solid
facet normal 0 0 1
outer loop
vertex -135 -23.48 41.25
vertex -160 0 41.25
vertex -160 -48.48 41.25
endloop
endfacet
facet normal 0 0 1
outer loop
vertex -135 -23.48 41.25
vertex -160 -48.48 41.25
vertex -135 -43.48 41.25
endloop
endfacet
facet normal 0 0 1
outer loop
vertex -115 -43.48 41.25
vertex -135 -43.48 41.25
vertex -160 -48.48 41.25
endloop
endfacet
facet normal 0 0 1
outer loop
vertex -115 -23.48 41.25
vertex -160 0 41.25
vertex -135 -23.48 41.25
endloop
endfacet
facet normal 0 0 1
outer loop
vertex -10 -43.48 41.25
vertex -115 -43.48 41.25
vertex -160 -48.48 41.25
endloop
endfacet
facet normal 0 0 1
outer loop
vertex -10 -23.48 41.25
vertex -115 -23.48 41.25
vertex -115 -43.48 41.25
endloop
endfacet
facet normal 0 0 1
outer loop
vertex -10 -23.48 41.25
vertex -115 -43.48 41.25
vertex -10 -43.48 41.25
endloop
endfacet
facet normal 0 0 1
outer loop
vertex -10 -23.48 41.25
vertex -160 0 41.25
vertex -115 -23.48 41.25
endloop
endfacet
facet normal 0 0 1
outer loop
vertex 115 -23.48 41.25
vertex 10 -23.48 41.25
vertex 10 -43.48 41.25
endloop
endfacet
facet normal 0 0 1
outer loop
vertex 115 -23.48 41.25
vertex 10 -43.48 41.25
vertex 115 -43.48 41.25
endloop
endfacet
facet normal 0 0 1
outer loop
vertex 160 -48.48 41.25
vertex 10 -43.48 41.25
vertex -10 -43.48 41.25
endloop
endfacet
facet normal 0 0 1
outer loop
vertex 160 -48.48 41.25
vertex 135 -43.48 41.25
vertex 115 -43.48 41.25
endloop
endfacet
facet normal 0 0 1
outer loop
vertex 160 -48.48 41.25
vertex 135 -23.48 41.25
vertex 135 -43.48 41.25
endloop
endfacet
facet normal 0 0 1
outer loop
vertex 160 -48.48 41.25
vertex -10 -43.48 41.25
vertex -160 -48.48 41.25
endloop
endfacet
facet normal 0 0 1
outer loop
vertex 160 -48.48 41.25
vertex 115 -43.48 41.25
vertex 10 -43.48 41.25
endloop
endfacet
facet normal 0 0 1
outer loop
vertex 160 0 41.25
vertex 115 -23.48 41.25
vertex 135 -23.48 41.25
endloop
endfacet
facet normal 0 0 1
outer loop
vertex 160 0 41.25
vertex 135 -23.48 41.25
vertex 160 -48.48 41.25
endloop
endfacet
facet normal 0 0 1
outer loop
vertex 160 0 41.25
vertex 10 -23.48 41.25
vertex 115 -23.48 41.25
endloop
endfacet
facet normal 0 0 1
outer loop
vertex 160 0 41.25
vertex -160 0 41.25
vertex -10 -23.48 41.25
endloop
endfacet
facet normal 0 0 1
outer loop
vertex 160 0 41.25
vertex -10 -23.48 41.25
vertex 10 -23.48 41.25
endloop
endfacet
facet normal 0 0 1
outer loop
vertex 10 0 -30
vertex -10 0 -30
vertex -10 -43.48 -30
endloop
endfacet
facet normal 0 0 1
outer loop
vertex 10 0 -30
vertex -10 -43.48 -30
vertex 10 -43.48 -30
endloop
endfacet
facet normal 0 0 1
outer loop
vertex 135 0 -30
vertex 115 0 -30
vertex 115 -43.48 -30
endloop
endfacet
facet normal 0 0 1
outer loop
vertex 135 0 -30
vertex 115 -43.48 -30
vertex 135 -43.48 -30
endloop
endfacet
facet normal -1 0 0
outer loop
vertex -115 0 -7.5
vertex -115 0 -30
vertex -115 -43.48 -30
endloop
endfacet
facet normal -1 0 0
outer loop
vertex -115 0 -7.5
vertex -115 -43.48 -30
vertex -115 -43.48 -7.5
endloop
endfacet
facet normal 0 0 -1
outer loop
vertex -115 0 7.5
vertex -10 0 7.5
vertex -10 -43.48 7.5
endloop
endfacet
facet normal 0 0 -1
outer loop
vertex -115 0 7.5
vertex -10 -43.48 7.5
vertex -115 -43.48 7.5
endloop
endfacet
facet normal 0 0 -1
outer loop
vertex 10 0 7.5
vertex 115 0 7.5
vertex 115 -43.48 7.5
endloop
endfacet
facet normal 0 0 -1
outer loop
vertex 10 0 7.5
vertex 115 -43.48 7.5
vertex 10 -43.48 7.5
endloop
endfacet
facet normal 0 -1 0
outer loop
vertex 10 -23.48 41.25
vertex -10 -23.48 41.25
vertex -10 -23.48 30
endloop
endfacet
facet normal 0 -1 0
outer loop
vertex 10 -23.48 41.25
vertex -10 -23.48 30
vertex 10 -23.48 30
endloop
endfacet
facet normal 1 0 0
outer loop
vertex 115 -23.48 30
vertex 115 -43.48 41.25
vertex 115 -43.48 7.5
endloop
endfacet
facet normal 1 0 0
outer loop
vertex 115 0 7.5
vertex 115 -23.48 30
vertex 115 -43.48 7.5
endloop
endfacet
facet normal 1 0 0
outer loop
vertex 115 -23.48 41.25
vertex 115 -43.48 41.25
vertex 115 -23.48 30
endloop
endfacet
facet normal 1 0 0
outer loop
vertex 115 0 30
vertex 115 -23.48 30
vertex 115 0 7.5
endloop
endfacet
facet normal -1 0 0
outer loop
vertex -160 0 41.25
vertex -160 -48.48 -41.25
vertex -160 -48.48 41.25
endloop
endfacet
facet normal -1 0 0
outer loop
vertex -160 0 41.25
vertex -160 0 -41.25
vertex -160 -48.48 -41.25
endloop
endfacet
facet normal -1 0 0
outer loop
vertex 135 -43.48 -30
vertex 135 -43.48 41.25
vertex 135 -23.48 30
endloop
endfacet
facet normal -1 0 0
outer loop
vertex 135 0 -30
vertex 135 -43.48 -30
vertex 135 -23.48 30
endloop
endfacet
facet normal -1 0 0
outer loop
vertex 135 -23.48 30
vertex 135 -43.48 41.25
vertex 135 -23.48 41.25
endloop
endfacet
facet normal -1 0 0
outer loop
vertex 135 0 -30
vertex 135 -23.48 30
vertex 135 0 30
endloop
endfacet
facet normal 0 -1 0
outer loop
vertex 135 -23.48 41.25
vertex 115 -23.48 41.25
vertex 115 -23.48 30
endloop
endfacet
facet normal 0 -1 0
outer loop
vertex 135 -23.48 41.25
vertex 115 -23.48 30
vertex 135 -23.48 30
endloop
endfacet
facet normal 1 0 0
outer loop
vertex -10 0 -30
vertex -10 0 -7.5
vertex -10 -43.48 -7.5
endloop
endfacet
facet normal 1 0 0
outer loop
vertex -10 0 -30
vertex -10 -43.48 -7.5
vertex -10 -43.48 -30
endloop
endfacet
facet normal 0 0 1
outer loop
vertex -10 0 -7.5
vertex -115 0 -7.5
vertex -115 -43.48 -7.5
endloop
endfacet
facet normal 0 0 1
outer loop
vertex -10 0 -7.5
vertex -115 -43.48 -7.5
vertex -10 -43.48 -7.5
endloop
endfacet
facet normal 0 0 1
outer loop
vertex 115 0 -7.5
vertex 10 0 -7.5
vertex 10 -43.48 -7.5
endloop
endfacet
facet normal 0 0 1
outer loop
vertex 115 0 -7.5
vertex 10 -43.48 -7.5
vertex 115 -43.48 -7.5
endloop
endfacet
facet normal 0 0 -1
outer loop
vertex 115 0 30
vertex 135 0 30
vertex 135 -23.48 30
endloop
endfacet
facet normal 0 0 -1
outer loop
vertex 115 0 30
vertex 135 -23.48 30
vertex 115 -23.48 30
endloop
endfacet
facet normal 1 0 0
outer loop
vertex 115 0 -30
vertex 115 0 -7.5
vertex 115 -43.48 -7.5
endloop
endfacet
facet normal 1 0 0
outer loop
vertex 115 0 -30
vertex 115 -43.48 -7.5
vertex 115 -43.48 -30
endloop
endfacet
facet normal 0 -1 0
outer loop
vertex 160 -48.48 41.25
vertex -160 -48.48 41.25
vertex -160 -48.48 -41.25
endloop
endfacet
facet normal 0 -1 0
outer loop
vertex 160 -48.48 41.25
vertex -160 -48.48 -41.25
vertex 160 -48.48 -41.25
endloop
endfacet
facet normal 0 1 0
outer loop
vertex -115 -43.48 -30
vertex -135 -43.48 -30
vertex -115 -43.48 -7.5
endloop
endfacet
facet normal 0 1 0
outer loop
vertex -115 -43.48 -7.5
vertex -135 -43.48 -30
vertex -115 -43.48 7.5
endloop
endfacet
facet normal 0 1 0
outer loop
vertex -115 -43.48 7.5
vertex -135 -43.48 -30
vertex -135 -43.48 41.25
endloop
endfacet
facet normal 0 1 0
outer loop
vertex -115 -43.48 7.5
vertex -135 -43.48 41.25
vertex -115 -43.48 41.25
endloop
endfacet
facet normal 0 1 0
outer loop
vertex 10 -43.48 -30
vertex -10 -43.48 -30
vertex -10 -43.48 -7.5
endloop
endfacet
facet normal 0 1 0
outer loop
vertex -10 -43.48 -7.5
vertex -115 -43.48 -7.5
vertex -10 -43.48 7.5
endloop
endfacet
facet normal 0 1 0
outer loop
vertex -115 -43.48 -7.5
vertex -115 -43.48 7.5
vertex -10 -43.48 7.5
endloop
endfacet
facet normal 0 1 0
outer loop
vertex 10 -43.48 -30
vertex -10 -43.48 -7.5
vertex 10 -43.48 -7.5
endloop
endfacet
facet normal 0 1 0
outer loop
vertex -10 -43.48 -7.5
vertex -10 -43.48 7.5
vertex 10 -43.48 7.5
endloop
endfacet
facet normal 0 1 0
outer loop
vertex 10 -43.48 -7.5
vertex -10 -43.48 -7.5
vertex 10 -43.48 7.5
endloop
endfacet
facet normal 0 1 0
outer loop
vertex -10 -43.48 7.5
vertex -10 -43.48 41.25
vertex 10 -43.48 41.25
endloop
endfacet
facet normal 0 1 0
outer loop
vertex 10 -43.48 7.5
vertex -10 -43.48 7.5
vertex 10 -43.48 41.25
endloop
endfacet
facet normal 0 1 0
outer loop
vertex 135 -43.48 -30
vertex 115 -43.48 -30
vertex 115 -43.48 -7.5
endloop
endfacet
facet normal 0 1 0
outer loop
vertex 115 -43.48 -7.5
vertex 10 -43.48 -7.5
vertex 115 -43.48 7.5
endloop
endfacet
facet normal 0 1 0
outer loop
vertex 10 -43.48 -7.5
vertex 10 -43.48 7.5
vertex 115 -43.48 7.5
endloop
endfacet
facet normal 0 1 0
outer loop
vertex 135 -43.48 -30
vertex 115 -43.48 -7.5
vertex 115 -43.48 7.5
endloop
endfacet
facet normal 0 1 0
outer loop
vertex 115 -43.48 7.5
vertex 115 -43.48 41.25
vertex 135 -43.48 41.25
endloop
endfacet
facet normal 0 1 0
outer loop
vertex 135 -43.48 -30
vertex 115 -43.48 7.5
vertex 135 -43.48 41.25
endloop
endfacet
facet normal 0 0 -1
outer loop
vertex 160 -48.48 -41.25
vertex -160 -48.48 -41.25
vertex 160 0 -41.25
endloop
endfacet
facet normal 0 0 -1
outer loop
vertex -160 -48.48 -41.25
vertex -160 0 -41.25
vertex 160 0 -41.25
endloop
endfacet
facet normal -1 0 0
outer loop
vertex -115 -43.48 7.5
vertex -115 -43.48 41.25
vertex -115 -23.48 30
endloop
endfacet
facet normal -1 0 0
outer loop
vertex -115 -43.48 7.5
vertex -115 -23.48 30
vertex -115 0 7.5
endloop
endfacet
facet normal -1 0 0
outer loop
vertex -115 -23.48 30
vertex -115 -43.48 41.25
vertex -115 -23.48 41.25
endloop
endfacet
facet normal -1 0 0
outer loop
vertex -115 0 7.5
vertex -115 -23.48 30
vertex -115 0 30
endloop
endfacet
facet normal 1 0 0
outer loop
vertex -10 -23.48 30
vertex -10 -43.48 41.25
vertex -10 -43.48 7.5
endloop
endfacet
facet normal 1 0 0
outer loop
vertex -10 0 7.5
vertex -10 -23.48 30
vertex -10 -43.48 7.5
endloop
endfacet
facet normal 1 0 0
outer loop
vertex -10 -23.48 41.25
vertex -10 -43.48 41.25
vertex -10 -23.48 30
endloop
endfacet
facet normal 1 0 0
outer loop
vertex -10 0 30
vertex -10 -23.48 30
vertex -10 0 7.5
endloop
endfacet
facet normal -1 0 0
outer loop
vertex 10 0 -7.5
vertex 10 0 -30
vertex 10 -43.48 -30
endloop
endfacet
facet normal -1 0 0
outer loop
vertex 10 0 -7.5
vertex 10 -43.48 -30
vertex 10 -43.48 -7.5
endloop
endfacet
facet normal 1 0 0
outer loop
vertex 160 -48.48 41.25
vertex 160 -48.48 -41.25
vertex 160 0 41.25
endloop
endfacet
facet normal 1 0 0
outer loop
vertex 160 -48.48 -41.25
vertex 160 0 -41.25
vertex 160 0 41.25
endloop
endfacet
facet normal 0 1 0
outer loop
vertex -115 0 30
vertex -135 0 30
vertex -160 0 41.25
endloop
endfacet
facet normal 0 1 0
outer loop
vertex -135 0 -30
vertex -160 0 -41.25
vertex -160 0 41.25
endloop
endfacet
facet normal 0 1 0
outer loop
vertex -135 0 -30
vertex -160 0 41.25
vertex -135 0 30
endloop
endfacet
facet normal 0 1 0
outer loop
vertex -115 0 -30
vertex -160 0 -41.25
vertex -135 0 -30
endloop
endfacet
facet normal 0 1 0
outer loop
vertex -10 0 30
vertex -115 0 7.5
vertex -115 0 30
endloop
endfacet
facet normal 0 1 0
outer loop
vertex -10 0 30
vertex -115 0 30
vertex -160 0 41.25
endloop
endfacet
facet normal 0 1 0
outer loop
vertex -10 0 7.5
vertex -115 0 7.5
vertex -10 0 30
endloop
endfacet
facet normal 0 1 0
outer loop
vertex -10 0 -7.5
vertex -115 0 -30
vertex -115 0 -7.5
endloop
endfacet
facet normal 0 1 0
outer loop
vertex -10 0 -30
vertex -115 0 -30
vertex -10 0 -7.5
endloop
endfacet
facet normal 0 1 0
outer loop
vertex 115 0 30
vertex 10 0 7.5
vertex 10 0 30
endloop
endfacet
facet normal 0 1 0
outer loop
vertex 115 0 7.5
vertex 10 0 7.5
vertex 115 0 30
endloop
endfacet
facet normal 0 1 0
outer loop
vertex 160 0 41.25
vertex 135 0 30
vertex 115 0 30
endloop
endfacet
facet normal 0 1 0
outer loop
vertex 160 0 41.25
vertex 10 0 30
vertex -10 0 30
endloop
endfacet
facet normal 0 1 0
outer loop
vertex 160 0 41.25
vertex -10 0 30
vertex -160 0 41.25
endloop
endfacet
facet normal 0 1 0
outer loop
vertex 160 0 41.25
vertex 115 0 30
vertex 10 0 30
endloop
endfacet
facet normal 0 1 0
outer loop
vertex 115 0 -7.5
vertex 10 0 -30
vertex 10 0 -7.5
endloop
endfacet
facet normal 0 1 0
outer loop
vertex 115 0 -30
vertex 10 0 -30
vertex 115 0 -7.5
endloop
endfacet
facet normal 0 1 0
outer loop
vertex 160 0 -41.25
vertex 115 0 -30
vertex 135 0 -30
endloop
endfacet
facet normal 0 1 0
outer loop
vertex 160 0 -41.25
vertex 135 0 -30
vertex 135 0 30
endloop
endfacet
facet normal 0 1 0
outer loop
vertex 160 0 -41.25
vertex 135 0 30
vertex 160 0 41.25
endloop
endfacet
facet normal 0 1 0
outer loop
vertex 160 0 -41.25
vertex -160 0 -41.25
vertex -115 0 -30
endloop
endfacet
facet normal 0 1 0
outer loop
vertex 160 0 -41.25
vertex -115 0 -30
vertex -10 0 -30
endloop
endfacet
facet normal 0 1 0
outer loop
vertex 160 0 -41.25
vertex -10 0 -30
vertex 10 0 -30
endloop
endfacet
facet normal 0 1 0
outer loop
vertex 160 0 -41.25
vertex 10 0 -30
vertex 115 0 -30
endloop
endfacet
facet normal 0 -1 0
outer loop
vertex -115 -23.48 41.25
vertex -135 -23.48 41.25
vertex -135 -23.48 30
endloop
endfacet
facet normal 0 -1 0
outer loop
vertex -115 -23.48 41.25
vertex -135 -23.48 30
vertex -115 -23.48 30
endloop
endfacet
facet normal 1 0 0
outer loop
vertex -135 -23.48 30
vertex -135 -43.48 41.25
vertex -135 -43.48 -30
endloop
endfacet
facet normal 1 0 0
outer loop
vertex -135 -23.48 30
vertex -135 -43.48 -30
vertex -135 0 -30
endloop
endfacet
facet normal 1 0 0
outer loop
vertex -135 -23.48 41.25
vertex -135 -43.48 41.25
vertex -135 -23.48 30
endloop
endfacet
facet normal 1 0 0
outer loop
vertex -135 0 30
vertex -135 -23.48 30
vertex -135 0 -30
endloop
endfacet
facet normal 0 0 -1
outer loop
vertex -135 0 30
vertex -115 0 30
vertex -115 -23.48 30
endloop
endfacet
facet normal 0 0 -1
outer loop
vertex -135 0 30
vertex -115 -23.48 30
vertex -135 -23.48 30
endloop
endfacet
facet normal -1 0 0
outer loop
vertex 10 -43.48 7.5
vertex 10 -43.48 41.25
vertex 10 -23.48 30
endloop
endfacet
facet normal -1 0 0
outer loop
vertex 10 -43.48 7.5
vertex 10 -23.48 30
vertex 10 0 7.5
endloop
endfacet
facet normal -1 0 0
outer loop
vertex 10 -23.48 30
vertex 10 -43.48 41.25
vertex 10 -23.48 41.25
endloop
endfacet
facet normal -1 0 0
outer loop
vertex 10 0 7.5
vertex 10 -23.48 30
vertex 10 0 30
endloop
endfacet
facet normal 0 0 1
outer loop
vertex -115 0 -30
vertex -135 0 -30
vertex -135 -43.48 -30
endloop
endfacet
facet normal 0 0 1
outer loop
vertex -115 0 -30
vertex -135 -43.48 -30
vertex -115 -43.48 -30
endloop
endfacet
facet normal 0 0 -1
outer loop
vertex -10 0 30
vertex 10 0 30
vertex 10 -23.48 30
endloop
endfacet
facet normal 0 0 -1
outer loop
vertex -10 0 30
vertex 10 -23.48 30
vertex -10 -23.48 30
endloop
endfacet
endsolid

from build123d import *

# Parameters (mm, degrees)
SKETCH1_W           = 320
SKETCH1_H           = 82.5
BOSS_EXTRUDE1_DEPTH = 43.48
SKETCH3_W           = 20
SKETCH3_H           = 20
CUT_EXTRUDE1_DEPTH  = 15
SKETCH5_W           = 320
SKETCH5_H           = 82.5
BOSS_EXTRUDE3_DEPTH = 5


with BuildPart() as part:
    # Sketch1 → Boss-Extrude1 (new body)
    with BuildSketch(Plane(origin=(0, 0, 0), x_dir=(1, 0, 0), z_dir=(0, 1, 0))):
        Rectangle(SKETCH1_W, SKETCH1_H)
        Polygon((-135, 30), (-115, 30), (-115, 7.5), (-10, 7.5), (-10, 30), (10, 30), (10, 7.5), (115, 7.5), (115, 30), (135, 30), (135, -30), (115, -30), (115, -7.5), (10, -7.5), (10, -30), (-10, -30), (-10, -7.5), (-115, -7.5), (-115, -30), (-135, -30), align=None, mode=Mode.SUBTRACT)
    extrude(amount=-BOSS_EXTRUDE1_DEPTH)

    # Sketch3 → Cut-Extrude1 (cut)
    with BuildSketch(Plane.XY.offset(41.25)):
        with Locations((0, -33.48)):
            Rectangle(SKETCH3_W, SKETCH3_H)
        with Locations((125, -33.48)):
            Rectangle(SKETCH3_W, SKETCH3_H)
        with Locations((-125, -33.48)):
            Rectangle(SKETCH3_W, SKETCH3_H)
    extrude(amount=-CUT_EXTRUDE1_DEPTH, mode=Mode.SUBTRACT)

    # Sketch5 → Boss-Extrude3 (add)
    with BuildSketch(Plane.XZ.offset(43.48)):
        Rectangle(SKETCH5_W, SKETCH5_H)
    extrude(amount=BOSS_EXTRUDE3_DEPTH)


solid = part.part
